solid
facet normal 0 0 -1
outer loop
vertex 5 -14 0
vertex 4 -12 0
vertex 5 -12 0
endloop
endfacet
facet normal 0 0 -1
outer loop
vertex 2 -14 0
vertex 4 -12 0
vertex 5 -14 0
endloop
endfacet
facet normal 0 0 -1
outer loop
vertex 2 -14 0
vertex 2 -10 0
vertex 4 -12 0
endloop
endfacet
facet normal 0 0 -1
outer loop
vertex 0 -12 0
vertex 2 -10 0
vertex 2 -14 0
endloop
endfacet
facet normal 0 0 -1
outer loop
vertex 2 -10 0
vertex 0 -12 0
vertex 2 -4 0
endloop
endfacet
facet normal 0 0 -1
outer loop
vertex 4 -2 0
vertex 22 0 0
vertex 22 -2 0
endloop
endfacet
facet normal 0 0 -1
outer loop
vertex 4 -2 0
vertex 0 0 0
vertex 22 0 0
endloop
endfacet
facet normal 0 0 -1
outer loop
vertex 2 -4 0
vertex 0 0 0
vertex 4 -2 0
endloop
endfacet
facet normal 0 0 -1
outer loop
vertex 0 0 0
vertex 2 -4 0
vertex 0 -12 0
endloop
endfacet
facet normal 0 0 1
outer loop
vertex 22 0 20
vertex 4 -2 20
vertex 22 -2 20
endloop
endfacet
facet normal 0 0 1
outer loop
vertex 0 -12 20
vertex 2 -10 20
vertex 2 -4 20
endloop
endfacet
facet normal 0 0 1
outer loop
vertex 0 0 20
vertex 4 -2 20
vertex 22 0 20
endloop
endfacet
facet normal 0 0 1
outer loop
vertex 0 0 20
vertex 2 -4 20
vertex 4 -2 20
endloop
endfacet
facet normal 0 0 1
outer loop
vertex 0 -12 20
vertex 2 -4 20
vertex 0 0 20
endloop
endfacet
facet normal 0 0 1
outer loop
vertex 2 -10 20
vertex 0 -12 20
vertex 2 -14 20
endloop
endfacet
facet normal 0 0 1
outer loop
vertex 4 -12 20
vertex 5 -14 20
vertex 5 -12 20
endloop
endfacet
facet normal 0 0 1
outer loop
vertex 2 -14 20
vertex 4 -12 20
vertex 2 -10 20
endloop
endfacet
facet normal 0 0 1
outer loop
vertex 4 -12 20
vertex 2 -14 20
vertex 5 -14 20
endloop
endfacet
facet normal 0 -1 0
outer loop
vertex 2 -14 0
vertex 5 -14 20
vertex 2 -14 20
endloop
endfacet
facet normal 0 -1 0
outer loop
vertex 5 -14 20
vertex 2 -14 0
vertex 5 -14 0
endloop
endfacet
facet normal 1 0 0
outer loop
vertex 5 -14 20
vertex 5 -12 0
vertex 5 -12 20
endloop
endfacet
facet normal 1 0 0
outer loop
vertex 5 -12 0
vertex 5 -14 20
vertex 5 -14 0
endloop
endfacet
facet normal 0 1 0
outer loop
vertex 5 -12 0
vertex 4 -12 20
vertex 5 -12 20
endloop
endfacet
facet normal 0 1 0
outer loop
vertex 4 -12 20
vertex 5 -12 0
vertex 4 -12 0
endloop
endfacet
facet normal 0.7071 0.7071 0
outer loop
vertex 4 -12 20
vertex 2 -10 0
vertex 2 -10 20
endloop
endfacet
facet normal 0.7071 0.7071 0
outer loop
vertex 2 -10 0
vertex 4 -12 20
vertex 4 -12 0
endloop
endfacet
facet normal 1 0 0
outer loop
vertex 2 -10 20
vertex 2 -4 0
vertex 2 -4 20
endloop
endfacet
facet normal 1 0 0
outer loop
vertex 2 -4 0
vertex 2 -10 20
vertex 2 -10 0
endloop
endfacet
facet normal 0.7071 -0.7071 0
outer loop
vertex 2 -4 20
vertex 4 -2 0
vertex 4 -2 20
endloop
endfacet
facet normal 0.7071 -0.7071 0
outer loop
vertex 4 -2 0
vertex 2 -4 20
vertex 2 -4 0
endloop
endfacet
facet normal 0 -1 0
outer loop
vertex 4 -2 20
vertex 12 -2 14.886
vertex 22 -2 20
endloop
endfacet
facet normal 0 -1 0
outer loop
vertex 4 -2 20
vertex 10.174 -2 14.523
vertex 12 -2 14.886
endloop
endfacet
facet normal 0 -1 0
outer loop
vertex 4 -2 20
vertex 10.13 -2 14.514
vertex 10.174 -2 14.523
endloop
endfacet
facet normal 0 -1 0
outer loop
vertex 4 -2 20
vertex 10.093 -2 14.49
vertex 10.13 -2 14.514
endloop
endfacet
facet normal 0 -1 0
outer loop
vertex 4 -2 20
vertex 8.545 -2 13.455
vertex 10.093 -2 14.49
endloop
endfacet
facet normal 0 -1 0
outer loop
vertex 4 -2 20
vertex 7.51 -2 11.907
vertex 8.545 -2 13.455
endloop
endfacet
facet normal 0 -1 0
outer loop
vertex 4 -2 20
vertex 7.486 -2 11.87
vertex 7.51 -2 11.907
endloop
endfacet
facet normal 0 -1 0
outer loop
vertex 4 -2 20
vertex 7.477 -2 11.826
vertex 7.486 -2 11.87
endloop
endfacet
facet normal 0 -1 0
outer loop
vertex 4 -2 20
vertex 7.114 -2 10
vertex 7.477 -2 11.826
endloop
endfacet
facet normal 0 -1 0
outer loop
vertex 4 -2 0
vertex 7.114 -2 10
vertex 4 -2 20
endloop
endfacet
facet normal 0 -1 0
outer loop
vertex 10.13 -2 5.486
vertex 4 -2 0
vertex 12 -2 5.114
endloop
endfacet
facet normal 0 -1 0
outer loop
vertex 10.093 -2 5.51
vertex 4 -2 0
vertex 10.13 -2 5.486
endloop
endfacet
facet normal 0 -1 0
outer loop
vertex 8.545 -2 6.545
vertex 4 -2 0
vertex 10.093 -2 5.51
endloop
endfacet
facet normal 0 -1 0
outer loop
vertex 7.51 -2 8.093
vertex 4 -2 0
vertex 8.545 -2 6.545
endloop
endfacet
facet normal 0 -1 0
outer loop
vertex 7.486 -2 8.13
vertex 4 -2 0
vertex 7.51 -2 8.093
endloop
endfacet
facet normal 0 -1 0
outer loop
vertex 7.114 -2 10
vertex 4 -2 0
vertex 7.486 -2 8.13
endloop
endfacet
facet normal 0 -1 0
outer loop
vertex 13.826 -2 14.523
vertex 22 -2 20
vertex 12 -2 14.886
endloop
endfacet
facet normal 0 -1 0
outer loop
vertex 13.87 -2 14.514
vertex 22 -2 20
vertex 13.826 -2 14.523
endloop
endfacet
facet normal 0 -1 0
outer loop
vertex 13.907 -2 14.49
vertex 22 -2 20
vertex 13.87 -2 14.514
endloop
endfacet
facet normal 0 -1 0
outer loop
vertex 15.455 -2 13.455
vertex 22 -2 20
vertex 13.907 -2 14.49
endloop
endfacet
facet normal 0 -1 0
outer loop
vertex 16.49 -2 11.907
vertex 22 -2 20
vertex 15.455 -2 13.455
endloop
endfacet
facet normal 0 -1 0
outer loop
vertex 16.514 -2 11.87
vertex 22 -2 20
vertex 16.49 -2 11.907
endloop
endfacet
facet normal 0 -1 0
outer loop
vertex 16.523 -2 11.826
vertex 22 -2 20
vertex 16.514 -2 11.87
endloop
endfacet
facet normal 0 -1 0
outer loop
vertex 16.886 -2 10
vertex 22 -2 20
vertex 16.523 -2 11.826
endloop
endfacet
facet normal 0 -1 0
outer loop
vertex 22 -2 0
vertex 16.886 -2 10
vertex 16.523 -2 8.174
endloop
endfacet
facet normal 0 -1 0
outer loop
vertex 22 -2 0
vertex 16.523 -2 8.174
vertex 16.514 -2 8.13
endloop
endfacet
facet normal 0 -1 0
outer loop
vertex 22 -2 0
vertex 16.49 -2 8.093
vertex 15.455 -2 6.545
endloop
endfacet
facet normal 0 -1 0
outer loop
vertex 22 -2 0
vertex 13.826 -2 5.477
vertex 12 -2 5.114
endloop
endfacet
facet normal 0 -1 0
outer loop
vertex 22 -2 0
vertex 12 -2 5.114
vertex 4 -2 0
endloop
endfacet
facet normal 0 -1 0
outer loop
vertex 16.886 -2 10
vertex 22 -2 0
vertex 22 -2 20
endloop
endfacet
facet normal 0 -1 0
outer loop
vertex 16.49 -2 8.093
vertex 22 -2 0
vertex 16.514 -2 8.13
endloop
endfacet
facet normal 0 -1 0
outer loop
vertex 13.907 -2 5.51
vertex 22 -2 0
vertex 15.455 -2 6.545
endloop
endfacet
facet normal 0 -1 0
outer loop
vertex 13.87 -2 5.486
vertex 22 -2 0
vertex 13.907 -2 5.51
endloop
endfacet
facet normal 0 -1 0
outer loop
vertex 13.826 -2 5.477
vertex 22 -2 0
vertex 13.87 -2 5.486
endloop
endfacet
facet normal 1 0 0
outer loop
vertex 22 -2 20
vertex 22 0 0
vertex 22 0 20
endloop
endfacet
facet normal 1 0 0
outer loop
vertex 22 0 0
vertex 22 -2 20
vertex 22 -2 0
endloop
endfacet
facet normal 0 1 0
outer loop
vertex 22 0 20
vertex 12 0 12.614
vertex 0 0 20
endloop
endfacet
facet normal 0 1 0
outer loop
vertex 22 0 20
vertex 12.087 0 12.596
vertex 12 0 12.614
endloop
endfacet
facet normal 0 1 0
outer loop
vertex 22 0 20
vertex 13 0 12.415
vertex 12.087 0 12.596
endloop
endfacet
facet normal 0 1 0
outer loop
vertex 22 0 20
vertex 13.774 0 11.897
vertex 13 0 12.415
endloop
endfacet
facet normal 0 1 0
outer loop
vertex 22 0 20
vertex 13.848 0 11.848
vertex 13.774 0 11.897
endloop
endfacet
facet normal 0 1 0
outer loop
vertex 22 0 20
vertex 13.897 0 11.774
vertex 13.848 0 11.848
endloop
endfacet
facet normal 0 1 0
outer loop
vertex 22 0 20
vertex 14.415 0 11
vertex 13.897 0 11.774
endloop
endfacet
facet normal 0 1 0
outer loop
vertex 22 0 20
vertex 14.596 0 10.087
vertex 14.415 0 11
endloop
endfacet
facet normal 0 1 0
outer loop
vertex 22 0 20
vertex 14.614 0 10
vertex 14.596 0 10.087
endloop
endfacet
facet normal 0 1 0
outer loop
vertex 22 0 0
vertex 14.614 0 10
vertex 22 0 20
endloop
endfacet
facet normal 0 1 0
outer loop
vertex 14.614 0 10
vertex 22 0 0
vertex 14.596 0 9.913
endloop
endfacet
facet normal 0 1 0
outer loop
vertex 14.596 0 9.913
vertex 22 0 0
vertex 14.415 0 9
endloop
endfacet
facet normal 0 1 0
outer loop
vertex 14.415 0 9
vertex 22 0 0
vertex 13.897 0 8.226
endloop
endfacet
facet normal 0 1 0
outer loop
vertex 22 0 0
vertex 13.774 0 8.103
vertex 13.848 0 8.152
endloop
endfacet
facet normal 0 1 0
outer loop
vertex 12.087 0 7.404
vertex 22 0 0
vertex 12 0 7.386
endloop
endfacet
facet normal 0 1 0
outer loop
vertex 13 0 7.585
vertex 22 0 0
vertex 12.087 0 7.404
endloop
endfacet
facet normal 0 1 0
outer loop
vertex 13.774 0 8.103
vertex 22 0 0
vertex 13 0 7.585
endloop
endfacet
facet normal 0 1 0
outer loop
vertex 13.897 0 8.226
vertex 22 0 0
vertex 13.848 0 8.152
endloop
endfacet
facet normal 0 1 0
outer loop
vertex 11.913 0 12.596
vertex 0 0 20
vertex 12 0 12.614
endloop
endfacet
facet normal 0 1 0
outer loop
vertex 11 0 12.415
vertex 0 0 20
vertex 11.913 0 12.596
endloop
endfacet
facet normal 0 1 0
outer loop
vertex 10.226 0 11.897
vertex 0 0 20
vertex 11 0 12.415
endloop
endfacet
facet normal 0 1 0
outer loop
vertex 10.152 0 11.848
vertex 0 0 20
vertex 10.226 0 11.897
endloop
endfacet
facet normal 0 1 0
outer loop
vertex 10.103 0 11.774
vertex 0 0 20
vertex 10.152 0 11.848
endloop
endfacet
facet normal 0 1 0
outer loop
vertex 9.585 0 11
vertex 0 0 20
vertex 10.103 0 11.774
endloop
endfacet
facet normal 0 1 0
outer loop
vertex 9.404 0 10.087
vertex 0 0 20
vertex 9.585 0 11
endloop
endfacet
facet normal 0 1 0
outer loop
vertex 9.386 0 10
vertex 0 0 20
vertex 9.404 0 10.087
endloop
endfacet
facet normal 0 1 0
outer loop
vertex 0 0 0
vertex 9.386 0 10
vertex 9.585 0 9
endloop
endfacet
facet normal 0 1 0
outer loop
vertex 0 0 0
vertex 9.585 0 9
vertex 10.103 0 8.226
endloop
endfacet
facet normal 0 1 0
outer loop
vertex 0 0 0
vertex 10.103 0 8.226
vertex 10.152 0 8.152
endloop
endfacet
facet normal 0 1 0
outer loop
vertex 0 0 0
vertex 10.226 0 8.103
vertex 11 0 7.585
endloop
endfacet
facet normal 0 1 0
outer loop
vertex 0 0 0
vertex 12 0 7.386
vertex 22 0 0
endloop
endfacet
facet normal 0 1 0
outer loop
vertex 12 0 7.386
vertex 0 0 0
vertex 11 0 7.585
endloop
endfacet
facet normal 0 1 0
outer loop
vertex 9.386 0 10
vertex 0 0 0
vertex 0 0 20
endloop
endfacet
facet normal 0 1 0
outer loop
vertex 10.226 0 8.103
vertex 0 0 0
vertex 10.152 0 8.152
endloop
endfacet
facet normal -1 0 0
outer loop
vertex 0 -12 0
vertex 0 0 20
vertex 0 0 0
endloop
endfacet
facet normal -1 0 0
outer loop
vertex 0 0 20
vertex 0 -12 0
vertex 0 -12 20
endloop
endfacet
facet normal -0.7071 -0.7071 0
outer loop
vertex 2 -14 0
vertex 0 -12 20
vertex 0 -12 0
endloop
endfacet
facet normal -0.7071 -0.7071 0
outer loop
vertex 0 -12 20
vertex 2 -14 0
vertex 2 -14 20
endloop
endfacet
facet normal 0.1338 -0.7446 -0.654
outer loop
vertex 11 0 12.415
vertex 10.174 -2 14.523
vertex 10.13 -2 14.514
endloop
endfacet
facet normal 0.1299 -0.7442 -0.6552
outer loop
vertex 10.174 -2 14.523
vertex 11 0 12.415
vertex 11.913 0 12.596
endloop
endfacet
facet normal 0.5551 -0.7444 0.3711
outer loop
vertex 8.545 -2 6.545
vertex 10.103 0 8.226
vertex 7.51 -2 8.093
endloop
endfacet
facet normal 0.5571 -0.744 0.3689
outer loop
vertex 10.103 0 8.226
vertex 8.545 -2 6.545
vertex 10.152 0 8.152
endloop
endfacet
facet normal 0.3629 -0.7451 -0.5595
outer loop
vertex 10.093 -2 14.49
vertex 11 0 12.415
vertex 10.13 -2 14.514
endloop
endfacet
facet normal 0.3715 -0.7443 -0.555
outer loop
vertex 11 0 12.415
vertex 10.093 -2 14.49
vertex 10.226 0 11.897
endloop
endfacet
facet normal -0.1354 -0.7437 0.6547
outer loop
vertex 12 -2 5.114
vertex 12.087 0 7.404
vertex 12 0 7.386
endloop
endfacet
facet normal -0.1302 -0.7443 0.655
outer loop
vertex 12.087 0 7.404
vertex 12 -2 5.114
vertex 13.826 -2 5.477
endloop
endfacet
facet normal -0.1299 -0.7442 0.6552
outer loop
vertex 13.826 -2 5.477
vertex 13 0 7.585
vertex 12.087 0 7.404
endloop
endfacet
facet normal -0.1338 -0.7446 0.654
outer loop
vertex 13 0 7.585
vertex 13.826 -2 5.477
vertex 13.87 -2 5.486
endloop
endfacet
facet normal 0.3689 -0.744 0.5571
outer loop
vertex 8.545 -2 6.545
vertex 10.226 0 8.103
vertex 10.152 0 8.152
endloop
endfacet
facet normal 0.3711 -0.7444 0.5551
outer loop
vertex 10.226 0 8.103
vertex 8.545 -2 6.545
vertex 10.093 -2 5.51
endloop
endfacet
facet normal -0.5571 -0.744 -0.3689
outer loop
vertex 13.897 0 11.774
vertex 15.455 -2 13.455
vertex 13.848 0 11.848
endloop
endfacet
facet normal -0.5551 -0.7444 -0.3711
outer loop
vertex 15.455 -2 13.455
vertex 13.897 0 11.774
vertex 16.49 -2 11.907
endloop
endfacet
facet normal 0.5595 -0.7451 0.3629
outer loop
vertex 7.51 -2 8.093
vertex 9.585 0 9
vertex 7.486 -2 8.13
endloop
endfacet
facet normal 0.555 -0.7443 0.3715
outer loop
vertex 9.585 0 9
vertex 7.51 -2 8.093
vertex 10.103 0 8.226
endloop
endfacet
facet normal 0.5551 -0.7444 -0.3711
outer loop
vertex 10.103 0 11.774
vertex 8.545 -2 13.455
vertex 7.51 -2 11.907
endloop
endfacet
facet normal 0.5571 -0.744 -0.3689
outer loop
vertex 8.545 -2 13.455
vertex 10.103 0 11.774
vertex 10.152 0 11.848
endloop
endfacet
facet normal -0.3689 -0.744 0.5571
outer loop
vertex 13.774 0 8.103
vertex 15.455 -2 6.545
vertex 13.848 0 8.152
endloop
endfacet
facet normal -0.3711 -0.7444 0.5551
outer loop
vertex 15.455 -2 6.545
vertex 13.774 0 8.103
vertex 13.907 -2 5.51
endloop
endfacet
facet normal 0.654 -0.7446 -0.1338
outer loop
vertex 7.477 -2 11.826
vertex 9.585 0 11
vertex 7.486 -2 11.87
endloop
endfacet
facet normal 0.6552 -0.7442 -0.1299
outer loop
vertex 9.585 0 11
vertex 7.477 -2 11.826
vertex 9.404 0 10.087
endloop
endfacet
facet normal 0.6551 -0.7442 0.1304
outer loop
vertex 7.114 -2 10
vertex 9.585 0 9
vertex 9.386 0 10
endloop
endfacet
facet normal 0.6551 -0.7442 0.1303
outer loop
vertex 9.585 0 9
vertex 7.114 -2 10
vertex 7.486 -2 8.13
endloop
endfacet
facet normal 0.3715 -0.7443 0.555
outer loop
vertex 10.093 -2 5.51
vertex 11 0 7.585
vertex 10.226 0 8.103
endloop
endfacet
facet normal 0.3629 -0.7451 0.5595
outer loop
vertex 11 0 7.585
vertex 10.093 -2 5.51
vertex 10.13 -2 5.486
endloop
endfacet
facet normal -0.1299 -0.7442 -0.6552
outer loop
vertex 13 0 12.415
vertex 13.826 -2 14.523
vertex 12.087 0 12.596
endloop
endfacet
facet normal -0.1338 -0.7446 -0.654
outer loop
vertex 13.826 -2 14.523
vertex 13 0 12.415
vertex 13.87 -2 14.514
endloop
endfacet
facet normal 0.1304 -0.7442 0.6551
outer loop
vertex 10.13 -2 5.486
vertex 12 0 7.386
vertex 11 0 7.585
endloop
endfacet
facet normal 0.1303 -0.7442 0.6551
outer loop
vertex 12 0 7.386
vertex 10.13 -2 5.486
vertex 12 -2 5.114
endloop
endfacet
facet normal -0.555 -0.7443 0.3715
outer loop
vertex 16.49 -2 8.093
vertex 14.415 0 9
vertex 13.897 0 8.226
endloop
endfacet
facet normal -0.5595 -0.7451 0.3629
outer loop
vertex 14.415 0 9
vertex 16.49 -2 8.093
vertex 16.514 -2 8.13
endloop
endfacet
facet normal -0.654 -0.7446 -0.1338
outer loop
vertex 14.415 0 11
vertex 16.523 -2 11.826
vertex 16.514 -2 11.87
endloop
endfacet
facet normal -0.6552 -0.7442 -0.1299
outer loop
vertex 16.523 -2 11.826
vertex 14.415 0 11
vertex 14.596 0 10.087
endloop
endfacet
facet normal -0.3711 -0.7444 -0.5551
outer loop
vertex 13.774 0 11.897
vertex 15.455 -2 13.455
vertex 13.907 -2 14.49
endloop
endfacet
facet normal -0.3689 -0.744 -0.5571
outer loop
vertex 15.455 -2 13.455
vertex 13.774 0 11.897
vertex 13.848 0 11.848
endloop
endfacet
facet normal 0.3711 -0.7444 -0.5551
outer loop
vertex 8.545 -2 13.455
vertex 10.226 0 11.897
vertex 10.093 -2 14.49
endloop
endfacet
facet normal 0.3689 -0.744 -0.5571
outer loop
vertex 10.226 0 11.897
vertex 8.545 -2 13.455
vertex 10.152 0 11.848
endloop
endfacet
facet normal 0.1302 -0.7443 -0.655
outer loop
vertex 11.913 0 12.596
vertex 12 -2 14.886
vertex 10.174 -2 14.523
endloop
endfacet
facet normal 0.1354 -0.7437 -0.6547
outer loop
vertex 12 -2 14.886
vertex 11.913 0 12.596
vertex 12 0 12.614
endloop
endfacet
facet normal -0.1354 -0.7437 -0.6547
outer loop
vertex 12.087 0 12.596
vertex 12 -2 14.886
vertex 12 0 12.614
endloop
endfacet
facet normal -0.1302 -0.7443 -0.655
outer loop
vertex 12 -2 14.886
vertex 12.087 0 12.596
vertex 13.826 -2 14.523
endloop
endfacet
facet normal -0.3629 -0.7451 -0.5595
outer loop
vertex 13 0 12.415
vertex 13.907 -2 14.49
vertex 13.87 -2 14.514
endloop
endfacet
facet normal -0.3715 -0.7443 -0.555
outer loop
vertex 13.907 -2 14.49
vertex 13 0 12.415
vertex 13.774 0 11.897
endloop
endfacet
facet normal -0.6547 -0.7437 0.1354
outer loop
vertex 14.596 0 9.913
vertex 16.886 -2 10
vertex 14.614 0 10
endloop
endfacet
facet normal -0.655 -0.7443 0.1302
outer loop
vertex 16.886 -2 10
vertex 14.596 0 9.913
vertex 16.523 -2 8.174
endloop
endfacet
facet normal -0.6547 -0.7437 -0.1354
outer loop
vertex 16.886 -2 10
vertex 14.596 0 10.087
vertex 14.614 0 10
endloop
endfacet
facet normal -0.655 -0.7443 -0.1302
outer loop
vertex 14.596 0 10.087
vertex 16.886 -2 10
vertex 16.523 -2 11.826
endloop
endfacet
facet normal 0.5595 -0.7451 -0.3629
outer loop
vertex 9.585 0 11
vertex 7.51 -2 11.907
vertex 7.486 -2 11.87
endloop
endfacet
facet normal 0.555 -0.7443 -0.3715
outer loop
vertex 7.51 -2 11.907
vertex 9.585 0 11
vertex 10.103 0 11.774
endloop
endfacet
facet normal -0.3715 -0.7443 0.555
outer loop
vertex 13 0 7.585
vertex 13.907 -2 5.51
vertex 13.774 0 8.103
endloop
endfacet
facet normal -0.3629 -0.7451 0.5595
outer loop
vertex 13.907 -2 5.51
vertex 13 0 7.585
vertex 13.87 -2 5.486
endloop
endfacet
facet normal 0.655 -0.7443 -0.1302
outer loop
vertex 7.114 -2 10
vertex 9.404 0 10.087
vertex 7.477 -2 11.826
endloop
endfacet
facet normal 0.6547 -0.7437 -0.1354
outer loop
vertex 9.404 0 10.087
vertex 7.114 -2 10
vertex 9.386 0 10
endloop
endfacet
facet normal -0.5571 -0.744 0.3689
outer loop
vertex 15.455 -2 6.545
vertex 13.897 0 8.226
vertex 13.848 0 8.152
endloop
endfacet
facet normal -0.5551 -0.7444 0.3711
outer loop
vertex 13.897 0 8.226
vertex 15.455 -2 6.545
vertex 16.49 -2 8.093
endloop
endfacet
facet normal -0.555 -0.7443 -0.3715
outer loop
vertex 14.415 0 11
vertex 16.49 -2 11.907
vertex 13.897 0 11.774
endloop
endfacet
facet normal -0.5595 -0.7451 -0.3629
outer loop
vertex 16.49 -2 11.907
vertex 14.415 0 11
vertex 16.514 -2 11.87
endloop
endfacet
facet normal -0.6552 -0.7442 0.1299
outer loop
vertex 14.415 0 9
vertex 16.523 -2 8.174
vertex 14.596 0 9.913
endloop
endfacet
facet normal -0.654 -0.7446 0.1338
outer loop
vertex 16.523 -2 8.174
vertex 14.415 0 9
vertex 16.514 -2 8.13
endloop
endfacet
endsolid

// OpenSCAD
// [FL_INDEX: keywords="openscad, 3d_parametric, Wall_bracket, csg_solid" | COT="Parametric OpenSCAD design from 3DCodeverse"]
// Title: Wall bracket

// Customizable Wall Bracket
// (c) 2013 Wouter Robers

// How thick is the thing you want to bracket?
ClampSize=10;

// Material thickness (thicker makes stronger, but less flexible).
Thickness=2;

// Height of the rim in the front of the bracket
RimHeight=3; 

// Corner bevel size (bigger bevel gives better strength)
Corner=2;


MakeBracket();

module MakeBracket(){
Width=20;
rotate([0,0,-90]) difference(){
linear_extrude(height = Width)
polygon([[0,0],[0,20+Thickness],[Thickness,20+Thickness],[Thickness,Thickness+Corner],[Thickness+Corner,Thickness],[Thickness+ClampSize-Corner,Thickness],[Thickness+ClampSize,Thickness+Corner],[Thickness+ClampSize,Thickness+RimHeight],[2*Thickness+ClampSize,Thickness+RimHeight],[2*Thickness+ClampSize,Corner],[2*Thickness+ClampSize-Corner,0]]);

# translate([-0.1,10+Thickness,Width/2]) rotate([0,90,0]) cylinder(r1=2.5,r2=5,h=Thickness+0.2);
}
}
